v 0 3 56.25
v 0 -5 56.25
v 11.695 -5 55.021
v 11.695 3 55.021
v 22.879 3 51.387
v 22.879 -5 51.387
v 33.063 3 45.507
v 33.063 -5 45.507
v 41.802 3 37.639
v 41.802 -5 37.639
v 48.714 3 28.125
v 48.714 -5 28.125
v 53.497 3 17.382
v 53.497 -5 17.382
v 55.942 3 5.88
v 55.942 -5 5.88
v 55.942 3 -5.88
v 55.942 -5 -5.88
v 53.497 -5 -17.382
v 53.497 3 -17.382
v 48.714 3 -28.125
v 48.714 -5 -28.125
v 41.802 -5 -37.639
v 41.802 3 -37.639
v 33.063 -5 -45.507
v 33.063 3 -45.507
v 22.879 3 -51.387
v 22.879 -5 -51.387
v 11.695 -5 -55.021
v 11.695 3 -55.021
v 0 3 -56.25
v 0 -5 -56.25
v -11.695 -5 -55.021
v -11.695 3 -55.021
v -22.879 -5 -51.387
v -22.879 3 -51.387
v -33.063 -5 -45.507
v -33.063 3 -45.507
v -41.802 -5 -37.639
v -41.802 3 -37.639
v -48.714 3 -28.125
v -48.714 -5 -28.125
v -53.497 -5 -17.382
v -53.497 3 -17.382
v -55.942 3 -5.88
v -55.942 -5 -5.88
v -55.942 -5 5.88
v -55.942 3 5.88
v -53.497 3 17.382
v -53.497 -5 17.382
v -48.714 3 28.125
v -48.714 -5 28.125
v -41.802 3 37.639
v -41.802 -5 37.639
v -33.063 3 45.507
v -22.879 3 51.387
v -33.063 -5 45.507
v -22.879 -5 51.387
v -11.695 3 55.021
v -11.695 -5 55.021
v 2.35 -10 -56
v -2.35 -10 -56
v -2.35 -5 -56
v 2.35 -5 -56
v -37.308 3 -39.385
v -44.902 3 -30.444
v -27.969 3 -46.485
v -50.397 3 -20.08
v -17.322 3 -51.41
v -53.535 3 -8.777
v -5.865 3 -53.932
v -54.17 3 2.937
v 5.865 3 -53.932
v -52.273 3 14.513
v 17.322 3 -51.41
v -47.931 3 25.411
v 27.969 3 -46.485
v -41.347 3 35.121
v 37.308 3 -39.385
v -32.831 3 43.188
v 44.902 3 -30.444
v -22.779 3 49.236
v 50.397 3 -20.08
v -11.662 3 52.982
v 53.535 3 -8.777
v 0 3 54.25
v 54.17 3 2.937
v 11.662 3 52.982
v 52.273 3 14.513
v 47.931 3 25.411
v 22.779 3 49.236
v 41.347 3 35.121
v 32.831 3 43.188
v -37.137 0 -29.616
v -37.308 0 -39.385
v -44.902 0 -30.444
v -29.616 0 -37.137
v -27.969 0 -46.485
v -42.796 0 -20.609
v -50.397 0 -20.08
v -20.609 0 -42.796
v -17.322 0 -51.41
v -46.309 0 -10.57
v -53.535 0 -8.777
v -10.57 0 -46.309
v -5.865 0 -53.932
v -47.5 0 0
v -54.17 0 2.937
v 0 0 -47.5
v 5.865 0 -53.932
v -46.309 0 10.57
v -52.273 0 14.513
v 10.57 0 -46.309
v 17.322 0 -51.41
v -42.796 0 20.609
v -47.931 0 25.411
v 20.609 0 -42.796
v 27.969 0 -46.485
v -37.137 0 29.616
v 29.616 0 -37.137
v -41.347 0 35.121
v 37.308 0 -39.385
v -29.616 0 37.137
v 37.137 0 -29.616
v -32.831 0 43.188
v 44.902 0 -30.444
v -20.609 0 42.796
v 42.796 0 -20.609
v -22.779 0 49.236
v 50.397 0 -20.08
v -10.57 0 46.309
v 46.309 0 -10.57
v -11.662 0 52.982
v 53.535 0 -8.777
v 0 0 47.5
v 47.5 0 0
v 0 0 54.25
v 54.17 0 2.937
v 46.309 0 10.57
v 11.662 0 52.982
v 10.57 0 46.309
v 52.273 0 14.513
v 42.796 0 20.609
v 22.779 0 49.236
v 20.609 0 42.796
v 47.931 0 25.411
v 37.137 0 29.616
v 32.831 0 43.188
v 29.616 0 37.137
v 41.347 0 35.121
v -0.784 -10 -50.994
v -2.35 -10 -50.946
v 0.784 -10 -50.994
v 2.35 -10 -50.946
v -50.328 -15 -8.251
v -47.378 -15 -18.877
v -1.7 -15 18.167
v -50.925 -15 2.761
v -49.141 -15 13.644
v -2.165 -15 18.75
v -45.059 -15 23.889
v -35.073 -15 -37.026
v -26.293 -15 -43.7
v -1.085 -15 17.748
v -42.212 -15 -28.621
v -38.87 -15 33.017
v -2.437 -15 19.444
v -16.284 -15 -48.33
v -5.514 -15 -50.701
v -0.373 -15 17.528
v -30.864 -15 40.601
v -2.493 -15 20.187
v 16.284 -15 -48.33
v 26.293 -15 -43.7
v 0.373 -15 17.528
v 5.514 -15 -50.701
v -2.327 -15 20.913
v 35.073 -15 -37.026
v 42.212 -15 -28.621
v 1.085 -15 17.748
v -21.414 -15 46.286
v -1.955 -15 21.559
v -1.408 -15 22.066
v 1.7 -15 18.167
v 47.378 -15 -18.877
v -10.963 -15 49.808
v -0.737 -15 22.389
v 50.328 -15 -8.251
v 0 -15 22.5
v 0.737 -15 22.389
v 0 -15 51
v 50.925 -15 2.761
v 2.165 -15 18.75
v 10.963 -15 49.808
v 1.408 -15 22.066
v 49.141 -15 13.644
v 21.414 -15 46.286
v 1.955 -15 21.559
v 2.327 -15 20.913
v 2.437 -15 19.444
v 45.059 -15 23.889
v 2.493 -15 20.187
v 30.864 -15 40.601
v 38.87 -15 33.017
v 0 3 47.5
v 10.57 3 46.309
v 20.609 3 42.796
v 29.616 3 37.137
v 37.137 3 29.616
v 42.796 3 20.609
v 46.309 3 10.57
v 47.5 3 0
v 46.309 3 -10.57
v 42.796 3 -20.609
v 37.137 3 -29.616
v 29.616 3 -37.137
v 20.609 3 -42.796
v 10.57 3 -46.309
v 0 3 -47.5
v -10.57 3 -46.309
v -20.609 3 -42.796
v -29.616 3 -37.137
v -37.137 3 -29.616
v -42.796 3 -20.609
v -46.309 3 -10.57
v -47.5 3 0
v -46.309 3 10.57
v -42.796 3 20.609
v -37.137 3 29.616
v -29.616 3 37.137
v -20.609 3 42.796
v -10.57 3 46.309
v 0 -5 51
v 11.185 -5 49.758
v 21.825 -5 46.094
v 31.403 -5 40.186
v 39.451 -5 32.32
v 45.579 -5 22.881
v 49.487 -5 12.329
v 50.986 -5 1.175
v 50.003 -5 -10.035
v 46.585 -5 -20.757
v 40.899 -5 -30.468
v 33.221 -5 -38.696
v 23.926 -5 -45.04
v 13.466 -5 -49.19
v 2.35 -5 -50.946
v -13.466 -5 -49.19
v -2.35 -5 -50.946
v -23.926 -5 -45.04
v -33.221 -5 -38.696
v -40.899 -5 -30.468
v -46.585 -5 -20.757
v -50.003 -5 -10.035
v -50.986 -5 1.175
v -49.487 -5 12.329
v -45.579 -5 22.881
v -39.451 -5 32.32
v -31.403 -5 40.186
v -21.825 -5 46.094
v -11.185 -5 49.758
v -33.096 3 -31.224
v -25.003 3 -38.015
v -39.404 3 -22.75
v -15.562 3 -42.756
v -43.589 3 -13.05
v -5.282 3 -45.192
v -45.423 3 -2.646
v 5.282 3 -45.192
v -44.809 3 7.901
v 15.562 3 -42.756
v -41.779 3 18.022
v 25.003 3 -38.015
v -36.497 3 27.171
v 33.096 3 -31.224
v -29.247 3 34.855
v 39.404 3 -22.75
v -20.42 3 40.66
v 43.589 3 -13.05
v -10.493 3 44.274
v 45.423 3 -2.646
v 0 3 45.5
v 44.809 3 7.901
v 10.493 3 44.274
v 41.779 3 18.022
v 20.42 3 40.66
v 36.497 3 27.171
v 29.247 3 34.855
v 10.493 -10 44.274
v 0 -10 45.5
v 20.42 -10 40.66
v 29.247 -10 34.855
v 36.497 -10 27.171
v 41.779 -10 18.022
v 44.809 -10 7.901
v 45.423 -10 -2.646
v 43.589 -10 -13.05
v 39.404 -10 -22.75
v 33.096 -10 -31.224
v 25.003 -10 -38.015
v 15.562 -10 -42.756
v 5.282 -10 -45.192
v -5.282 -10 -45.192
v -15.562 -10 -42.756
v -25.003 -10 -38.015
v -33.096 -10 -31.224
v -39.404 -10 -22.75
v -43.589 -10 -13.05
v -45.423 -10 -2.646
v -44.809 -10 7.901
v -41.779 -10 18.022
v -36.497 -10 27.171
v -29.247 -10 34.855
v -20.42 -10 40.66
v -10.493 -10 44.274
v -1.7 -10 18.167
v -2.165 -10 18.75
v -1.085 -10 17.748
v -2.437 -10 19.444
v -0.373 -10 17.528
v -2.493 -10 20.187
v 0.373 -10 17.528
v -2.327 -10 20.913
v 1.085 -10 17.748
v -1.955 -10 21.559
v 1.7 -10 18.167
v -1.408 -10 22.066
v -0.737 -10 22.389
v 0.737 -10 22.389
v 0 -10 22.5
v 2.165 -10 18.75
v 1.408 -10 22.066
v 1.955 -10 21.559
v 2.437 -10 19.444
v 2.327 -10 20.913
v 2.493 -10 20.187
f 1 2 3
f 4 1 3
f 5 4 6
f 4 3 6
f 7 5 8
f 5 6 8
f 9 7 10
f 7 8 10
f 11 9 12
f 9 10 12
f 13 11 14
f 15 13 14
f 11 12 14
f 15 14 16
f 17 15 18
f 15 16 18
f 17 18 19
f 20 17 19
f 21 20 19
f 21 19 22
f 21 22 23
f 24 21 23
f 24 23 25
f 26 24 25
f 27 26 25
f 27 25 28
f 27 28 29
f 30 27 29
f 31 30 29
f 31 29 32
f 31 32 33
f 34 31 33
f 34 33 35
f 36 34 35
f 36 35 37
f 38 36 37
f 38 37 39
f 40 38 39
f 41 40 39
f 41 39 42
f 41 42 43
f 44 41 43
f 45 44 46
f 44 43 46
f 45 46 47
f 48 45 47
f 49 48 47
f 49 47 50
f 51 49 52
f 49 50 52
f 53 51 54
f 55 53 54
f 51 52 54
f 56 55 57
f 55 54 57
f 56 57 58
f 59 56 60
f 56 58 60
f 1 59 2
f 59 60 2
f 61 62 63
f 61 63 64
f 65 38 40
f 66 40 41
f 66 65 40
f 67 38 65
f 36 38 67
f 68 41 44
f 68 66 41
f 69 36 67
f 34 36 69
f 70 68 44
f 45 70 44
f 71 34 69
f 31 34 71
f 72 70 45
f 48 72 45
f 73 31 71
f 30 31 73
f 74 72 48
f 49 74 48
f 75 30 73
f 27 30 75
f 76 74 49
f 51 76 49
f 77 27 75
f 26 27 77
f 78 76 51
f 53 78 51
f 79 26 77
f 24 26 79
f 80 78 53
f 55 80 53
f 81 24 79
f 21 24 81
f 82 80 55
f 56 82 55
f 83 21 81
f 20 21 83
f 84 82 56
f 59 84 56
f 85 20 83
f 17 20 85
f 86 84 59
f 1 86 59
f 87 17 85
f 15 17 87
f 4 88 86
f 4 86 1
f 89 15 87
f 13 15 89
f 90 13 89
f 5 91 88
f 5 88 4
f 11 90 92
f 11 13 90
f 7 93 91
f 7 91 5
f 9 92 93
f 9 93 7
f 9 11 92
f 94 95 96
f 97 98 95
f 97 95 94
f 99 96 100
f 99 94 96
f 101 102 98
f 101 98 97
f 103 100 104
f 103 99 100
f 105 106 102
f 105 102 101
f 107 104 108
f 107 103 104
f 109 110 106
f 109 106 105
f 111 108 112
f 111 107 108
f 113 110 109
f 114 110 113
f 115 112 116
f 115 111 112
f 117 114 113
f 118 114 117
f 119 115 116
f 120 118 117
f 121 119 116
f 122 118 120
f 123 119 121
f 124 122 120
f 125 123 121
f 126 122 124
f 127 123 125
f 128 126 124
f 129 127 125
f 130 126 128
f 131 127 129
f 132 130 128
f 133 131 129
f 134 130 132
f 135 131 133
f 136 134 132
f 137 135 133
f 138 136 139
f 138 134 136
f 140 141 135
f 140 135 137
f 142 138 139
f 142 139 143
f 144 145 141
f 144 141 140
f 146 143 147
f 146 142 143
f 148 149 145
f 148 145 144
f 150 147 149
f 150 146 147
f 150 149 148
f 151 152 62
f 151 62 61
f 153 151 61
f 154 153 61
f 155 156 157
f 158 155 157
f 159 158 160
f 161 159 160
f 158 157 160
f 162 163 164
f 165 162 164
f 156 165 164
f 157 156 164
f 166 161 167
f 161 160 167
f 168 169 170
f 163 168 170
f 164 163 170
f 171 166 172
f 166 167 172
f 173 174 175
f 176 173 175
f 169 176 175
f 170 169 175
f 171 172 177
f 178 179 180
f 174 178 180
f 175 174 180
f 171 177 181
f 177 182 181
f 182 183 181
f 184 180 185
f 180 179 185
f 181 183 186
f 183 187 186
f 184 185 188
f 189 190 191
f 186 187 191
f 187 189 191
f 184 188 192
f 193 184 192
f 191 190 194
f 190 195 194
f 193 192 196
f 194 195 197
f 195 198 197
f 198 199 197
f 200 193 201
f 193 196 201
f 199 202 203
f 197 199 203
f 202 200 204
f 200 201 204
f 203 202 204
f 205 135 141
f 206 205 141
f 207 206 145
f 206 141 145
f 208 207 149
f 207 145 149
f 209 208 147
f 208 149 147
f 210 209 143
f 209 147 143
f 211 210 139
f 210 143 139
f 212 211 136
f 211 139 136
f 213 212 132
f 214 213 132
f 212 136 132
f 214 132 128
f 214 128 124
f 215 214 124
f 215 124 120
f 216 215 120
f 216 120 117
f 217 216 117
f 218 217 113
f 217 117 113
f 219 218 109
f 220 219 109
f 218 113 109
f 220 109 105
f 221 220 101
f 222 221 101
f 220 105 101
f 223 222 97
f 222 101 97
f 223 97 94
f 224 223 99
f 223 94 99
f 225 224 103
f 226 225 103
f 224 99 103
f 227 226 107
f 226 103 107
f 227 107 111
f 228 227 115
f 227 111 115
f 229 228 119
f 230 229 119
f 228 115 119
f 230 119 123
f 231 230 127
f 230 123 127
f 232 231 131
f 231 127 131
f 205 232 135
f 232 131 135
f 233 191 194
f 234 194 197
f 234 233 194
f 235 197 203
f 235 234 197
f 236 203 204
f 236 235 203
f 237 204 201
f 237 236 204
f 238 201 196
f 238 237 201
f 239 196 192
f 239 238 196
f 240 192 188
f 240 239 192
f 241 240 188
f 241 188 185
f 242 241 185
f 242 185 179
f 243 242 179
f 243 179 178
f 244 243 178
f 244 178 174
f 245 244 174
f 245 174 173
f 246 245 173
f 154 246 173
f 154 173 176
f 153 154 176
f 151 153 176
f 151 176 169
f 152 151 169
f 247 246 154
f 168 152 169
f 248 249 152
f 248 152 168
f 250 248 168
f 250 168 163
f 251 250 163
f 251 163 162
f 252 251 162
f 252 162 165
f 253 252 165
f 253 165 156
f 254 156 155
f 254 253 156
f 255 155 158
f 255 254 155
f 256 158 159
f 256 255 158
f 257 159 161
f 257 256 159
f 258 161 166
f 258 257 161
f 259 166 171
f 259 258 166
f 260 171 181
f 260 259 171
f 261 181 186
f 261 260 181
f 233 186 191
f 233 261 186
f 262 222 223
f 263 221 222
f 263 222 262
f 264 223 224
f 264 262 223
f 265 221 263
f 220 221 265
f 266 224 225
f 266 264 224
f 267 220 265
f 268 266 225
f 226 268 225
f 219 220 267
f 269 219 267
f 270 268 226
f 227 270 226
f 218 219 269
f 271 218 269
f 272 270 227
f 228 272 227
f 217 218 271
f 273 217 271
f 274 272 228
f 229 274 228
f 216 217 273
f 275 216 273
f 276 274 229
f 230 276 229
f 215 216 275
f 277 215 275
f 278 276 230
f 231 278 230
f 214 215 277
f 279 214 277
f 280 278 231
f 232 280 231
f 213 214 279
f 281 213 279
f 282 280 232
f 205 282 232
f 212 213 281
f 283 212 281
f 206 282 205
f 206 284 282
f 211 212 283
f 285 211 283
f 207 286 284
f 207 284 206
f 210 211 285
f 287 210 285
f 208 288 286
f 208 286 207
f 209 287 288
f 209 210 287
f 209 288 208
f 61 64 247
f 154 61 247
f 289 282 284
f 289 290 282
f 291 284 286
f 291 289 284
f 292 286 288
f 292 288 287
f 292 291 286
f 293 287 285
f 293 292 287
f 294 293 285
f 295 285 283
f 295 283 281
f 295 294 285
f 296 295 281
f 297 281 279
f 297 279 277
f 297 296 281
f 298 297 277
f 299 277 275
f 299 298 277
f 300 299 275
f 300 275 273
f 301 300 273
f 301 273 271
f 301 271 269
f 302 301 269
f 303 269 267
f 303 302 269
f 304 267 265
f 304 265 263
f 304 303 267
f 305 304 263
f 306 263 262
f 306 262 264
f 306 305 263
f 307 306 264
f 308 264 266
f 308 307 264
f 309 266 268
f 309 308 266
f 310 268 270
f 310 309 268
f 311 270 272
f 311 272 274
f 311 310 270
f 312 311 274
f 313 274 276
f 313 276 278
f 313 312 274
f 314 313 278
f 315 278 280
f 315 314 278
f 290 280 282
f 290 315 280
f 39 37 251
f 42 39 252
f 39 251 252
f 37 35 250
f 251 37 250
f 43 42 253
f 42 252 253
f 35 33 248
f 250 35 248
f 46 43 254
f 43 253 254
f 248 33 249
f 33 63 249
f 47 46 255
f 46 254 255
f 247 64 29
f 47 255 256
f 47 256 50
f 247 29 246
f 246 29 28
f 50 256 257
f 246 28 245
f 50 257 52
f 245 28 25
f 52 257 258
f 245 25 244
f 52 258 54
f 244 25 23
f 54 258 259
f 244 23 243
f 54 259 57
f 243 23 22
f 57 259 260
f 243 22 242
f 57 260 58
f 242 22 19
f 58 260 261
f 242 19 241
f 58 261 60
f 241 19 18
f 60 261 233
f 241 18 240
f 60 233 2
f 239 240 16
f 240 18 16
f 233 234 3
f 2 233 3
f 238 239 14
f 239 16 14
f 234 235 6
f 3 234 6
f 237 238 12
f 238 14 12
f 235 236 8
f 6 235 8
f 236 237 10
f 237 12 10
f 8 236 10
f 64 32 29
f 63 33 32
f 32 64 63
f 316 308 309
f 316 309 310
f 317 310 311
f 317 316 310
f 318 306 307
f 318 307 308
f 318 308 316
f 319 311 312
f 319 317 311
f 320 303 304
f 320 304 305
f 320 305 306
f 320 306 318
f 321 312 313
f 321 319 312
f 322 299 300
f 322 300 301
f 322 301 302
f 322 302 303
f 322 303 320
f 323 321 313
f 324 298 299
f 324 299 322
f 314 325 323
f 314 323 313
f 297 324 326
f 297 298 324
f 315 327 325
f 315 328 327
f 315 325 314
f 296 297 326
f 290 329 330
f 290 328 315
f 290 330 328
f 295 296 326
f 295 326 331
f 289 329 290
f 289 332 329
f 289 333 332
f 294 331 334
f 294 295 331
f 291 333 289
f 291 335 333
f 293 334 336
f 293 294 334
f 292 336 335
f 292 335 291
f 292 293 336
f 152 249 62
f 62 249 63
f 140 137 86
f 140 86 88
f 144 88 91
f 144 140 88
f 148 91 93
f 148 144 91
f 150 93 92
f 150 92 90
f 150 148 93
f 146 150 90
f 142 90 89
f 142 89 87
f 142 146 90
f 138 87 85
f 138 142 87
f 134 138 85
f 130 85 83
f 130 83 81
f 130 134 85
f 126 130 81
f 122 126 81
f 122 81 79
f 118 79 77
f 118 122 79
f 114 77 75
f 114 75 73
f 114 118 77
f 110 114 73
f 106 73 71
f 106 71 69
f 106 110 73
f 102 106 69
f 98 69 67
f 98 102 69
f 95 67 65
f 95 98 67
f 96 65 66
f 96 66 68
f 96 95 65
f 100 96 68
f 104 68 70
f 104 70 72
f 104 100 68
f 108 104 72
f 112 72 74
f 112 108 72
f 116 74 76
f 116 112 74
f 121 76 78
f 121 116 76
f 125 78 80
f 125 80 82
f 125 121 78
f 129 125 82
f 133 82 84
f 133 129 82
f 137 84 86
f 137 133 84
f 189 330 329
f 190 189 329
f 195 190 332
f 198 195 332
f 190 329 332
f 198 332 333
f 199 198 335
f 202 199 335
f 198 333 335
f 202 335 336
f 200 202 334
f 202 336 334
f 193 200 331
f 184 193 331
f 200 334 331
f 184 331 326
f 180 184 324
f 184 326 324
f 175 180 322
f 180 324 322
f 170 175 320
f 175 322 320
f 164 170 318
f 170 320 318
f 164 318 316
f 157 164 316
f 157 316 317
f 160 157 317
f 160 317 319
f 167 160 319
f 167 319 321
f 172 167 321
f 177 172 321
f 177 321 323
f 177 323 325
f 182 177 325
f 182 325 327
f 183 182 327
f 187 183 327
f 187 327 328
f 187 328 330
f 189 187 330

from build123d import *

# Parameters (mm, degrees)
SKETCH1_R             = 56.25
SKETCH1_R_2           = 54.25
BOSS_EXTRUDE1_DEPTH   = 3
SKETCH1_R_3           = 47.5
SKETCH1_R_4           = 45.5
BOSS_EXTRUDE1_2_DEPTH = 3
SKETCH1_3_R           = 51
BOSS_EXTRUDE2_DEPTH   = 15
BOSS_EXTRUDE3_START   = -5
SKETCH1_4_R           = 56.25
BOSS_EXTRUDE3_DEPTH   = 5
BOSS_EXTRUDE4_DEPTH   = 5
CUT_EXTRUDE1_START    = -10
SKETCH1_5_R           = 45.5
CUT_EXTRUDE1_DEPTH    = 10
SKETCH3_R             = 2.5
CUT_EXTRUDE2_DEPTH    = 81.604745518


with BuildPart() as part:
    # Sketch1 → Boss-Extrude1 (new body)
    with BuildSketch(Plane(origin=(0, 0, 0), x_dir=(1, 0, 0), z_dir=(0, 1, 0))):
        Circle(SKETCH1_R)
        Circle(SKETCH1_R_2, mode=Mode.SUBTRACT)
    extrude(amount=BOSS_EXTRUDE1_DEPTH)



with BuildPart() as body_2:
    # Sketch1 → Boss-Extrude1 2 (new body)
    with BuildSketch(Plane(origin=(0, 0, 0), x_dir=(1, 0, 0), z_dir=(0, 1, 0))):
        Circle(SKETCH1_R_3)
        Circle(SKETCH1_R_4, mode=Mode.SUBTRACT)
    extrude(amount=BOSS_EXTRUDE1_2_DEPTH)


with BuildPart() as body_3:
    # Sketch1<3> → Boss-Extrude2 (new body)
    with BuildSketch(Plane(origin=(0, 0, 0), x_dir=(1, 0, 0), z_dir=(0, 1, 0))):
        Circle(SKETCH1_3_R)
    extrude(amount=-BOSS_EXTRUDE2_DEPTH)


with BuildPart() as part_1:
    add(part.part)

    add(body_2.part)  # Boss-Extrude3 merges body 2

    add(body_3.part)  # Boss-Extrude3 merges body 3
    # Sketch1<4> → Boss-Extrude3 (add)
    with BuildSketch(Plane(origin=(0, 0, 0), x_dir=(1, 0, 0), z_dir=(0, 1, 0)).offset(BOSS_EXTRUDE3_START)):
        Circle(SKETCH1_4_R)
    extrude(amount=BOSS_EXTRUDE3_DEPTH)

    # Sketch2 → Boss-Extrude4 (add)
    with BuildSketch(Plane.XZ.offset(5)):
        Polygon((-2.35, -51), (-2.35, -56), (2.35, -56), (2.35, -51), (2.35, -50), (-2.35, -50), align=None)
    extrude(amount=BOSS_EXTRUDE4_DEPTH)

    # Sketch1<5> → Cut-Extrude1 (cut)
    with BuildSketch(Plane(origin=(0, 0, 0), x_dir=(1, 0, 0), z_dir=(0, 1, 0)).offset(CUT_EXTRUDE1_START)):
        Circle(SKETCH1_5_R)
    extrude(amount=CUT_EXTRUDE1_DEPTH, mode=Mode.SUBTRACT)

    # Sketch3 → Cut-Extrude2 (cut, through all)
    with BuildSketch(Plane(origin=(0, -10, 0), x_dir=(1, 0, 0), z_dir=(0, 1, 0))):
        with Locations((0, -20)):
            Circle(SKETCH3_R)
    extrude(amount=-CUT_EXTRUDE2_DEPTH, mode=Mode.SUBTRACT)


solid = part_1.part
